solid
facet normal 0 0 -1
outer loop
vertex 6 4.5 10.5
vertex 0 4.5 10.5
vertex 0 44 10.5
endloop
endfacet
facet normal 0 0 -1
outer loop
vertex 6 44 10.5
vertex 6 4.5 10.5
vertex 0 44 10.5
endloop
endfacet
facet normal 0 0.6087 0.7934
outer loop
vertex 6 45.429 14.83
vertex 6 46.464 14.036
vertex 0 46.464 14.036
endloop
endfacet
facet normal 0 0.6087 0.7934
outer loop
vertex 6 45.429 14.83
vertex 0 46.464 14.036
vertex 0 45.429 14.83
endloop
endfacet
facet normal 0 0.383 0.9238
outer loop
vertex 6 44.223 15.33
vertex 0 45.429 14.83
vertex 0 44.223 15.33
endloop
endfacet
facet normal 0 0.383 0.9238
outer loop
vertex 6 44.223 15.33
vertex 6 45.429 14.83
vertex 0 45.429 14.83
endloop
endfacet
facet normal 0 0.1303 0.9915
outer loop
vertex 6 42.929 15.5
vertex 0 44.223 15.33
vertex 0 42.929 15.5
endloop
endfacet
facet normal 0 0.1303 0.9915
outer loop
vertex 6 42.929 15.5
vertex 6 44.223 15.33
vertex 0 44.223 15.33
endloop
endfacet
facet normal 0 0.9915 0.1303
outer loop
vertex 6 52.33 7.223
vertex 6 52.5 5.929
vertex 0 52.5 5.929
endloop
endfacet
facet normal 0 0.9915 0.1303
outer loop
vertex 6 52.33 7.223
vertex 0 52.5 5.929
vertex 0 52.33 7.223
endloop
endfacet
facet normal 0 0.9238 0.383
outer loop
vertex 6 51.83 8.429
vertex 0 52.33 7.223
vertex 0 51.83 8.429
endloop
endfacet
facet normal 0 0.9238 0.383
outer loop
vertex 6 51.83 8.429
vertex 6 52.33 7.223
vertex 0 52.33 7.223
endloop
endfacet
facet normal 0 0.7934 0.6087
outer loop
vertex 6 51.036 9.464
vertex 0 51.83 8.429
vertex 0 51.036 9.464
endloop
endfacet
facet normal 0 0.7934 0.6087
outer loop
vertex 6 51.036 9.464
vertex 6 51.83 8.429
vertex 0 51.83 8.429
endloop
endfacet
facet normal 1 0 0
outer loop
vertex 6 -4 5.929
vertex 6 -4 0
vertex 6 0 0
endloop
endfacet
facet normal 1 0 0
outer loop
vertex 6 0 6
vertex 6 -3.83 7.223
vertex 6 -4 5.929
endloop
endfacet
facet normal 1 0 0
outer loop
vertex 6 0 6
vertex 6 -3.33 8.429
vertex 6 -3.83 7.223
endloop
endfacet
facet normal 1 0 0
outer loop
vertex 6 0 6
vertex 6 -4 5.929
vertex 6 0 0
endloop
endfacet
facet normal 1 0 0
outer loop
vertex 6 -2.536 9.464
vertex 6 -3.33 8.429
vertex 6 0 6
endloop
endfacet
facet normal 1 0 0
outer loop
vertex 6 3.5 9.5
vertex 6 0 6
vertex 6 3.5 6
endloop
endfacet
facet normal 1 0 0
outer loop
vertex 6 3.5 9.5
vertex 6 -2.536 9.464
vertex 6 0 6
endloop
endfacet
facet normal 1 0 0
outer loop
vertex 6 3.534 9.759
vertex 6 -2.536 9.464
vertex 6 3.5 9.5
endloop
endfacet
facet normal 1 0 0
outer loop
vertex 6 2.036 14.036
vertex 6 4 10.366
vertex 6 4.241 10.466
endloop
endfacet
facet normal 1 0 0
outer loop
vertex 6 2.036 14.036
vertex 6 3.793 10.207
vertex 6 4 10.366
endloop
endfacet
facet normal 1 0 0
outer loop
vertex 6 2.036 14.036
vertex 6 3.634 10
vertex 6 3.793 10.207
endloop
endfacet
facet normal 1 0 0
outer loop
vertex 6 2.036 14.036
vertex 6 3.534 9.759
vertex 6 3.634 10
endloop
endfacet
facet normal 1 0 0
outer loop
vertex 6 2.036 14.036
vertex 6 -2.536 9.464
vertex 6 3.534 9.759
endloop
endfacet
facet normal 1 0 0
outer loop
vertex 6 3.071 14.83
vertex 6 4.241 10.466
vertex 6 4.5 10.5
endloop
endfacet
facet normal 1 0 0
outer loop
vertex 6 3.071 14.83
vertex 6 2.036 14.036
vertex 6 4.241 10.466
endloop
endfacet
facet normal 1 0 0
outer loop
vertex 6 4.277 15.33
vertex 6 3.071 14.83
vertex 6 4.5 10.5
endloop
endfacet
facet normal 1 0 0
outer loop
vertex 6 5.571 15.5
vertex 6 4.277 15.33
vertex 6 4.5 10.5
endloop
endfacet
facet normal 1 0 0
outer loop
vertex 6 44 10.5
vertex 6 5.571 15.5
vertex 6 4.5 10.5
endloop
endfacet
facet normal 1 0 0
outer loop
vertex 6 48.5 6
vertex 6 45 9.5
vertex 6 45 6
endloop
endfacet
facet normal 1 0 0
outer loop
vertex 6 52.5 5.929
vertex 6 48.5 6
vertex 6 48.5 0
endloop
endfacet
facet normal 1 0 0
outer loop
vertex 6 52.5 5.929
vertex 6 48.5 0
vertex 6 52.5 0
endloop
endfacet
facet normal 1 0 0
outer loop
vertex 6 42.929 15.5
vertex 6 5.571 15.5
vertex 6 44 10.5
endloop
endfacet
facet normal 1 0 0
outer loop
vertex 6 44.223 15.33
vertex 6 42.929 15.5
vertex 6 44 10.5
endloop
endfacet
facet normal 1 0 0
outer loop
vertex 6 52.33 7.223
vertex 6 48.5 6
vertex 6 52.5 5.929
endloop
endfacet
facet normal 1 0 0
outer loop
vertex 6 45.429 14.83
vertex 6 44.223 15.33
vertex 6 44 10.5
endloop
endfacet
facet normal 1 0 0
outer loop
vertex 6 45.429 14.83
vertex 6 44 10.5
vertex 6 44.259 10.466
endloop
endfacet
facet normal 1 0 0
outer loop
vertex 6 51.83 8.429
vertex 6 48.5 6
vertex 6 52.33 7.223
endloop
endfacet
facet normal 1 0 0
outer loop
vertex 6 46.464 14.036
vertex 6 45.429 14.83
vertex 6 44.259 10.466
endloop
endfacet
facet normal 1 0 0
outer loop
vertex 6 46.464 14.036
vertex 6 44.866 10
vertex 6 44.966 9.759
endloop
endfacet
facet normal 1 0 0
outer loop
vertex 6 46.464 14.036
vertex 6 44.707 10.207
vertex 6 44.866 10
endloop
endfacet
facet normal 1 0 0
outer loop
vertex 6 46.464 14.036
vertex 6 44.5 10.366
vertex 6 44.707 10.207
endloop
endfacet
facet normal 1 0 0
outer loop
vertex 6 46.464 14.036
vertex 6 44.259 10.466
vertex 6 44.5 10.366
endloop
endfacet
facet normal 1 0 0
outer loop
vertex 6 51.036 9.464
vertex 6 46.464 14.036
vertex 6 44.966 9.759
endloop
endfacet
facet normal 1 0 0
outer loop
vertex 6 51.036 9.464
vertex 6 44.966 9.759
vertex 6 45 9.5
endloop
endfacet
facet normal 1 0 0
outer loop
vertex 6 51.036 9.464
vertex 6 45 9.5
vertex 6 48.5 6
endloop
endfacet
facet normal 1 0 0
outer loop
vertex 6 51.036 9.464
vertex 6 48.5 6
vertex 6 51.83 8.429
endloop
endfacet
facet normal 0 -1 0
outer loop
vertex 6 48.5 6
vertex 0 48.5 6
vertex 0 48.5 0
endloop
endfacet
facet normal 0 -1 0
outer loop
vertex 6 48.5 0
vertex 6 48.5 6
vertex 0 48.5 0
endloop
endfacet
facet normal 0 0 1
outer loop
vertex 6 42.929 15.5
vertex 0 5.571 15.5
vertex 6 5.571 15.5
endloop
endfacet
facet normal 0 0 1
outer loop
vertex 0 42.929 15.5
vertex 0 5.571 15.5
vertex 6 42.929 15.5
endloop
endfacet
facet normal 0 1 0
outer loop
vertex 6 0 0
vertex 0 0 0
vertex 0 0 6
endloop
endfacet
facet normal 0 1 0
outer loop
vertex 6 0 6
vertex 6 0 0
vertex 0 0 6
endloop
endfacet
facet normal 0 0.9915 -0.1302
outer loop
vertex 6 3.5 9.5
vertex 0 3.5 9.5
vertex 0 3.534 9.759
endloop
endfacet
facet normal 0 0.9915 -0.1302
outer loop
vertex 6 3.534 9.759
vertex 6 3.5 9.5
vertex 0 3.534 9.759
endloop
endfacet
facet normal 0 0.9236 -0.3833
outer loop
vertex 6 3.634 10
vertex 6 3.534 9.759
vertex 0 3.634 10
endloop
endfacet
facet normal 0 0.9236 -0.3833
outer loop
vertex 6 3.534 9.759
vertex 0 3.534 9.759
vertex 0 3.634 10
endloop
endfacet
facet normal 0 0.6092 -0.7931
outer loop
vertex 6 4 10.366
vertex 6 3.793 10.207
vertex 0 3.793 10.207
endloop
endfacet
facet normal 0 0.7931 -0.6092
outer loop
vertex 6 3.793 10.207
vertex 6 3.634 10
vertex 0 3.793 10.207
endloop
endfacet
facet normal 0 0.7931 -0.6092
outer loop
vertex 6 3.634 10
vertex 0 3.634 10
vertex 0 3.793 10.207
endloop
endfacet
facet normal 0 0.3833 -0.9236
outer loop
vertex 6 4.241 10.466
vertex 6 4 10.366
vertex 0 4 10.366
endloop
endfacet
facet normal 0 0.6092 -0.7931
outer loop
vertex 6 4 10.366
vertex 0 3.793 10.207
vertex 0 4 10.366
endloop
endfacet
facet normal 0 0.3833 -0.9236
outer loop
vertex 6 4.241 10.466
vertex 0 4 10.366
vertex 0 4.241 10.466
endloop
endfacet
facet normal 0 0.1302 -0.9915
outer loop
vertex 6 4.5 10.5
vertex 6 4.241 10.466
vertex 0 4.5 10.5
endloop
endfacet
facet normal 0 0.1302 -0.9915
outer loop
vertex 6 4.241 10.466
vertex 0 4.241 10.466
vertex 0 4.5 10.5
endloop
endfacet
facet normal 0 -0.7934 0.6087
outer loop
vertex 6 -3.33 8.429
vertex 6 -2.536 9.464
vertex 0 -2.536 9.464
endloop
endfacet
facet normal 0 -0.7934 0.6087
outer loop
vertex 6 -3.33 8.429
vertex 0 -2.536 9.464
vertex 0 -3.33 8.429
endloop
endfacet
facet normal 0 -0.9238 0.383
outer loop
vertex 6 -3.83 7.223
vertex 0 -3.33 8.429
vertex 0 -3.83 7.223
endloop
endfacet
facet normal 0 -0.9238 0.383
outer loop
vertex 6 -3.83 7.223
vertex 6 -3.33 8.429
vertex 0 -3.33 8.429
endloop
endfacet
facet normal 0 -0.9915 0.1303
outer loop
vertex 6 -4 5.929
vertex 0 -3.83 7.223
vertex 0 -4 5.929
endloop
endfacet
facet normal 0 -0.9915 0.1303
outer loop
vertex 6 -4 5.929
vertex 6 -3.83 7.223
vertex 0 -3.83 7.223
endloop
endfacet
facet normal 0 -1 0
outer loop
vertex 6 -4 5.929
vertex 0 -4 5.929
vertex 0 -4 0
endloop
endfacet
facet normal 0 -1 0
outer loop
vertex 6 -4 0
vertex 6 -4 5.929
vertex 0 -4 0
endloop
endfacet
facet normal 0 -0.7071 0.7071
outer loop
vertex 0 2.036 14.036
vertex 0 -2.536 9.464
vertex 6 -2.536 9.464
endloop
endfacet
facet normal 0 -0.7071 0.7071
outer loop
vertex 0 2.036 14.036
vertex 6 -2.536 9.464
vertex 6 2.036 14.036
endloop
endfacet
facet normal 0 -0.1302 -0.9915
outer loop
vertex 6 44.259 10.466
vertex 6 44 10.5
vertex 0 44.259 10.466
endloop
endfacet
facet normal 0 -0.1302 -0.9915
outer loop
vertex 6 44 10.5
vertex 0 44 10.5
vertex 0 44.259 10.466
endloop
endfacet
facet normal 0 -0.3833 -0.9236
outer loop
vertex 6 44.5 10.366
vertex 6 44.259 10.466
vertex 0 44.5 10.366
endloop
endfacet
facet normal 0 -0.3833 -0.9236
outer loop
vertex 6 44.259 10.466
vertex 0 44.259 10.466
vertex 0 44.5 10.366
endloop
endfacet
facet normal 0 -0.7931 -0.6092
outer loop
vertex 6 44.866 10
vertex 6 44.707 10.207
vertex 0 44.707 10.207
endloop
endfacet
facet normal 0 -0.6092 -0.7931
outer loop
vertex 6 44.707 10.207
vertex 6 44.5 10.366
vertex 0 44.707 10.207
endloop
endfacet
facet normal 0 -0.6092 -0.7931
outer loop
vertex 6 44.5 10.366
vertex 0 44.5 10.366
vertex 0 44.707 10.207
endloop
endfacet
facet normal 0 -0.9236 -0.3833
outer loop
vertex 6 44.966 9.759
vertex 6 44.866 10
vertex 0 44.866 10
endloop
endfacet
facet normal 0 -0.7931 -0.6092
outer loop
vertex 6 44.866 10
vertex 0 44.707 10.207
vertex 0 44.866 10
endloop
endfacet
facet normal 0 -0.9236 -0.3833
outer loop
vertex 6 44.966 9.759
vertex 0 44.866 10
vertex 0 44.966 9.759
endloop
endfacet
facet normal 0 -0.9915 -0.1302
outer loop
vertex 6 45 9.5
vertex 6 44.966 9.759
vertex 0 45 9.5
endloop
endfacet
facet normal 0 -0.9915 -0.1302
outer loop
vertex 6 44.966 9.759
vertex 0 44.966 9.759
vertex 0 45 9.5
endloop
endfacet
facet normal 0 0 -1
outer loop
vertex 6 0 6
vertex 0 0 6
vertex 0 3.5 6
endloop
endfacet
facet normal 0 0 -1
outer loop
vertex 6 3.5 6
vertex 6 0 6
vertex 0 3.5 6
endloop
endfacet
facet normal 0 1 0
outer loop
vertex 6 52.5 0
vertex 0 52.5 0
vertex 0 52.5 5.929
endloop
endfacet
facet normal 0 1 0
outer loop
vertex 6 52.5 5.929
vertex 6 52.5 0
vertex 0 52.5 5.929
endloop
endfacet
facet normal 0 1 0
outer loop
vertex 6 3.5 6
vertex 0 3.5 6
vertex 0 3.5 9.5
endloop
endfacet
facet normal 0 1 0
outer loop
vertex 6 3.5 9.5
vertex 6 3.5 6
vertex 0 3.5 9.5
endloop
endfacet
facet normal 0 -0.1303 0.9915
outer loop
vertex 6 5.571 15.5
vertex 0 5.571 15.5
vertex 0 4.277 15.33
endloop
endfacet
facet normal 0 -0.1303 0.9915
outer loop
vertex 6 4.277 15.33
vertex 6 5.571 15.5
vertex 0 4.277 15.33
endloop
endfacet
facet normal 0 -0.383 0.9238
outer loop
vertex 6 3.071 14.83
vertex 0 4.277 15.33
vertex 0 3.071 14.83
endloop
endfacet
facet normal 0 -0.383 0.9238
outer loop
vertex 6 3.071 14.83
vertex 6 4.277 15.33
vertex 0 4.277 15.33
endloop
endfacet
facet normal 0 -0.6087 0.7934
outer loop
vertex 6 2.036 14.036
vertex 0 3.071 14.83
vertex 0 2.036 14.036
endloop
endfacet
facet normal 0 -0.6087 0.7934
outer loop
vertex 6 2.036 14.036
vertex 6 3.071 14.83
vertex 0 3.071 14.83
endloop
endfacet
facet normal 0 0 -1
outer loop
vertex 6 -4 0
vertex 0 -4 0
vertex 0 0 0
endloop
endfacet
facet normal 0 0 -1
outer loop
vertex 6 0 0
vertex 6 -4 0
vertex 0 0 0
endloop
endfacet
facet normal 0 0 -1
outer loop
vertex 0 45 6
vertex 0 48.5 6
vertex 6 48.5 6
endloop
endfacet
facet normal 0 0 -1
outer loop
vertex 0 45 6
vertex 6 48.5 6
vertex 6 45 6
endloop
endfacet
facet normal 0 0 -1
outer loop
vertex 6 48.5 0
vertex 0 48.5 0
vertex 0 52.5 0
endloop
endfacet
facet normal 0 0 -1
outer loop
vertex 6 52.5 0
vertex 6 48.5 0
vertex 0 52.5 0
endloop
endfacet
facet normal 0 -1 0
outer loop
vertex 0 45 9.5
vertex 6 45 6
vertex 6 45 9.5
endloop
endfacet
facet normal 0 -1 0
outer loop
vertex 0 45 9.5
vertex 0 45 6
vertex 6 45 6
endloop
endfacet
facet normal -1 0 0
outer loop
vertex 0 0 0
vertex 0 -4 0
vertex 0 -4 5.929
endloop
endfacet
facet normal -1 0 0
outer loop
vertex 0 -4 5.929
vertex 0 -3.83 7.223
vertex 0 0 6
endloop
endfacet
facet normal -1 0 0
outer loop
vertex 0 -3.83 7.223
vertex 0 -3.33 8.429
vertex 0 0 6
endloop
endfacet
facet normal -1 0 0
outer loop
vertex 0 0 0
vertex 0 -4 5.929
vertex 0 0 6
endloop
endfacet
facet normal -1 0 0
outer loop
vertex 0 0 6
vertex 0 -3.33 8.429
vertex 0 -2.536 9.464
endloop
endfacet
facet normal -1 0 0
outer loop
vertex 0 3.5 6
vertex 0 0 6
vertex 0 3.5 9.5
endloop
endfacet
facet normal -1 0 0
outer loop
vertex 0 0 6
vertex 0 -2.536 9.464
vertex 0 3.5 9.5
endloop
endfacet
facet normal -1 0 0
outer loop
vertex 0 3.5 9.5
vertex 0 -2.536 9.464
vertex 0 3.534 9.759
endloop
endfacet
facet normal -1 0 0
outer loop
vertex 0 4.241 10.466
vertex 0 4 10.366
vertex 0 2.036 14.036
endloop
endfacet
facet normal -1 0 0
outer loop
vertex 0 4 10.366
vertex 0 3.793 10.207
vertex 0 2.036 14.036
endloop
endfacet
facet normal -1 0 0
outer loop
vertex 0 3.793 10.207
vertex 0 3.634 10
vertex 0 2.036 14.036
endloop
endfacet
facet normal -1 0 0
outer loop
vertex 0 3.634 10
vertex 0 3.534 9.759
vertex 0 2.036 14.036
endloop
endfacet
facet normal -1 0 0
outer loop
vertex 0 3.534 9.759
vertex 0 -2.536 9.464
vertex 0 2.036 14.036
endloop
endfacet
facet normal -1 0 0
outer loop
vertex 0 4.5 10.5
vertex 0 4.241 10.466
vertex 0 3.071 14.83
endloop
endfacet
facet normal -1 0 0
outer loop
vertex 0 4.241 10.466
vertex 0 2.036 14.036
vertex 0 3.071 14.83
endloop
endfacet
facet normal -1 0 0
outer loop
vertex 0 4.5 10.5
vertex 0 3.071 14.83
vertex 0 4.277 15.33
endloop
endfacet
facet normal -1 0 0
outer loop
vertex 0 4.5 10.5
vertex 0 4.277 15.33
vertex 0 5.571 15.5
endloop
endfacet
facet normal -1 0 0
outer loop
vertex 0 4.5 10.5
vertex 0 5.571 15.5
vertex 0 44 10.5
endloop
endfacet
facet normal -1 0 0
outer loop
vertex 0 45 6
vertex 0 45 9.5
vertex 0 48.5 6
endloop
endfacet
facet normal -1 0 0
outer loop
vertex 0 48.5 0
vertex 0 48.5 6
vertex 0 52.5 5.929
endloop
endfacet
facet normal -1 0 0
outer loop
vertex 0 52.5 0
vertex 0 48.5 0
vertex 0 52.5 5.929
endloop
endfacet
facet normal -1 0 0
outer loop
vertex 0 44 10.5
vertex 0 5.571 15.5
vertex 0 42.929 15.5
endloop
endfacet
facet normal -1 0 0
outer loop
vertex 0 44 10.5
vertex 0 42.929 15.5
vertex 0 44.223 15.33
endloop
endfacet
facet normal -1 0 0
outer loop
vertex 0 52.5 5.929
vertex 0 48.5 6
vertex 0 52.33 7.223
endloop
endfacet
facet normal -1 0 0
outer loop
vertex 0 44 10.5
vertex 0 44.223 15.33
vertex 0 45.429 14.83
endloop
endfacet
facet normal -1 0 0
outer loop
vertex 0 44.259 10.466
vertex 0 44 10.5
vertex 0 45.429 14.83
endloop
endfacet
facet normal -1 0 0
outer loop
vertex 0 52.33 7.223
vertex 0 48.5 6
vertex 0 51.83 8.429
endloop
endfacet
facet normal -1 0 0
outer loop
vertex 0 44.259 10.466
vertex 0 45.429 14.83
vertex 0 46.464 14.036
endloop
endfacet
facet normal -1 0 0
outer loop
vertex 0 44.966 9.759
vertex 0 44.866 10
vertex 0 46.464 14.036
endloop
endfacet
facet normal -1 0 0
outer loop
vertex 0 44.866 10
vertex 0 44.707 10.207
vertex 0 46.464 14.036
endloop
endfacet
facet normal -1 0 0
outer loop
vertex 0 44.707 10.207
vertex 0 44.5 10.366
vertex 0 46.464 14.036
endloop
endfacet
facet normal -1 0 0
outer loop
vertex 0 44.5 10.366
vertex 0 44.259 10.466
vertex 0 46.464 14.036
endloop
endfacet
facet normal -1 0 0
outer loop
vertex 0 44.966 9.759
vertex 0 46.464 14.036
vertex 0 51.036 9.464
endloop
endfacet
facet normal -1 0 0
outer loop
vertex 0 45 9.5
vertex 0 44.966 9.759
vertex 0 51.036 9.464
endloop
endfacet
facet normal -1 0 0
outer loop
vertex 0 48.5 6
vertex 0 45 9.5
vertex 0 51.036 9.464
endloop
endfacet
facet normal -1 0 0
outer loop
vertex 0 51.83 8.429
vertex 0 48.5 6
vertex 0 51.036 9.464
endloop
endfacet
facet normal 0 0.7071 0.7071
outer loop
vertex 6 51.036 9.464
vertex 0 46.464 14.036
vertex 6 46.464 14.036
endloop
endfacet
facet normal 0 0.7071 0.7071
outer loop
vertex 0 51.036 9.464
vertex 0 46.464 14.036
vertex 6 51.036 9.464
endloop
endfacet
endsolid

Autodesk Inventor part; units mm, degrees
ref_plane "YZ Plane" through (0, 0, 0) normal (1, 0, 0) x (0, 1, 0)
ref_plane "XZ Plane" through (0, 0, 0) normal (0, 1, 0) x (-1, 0, 0)
ref_plane "XY Plane" through (0, 0, 0) normal (0, 0, 1) x (1, 0, 0)
sketch "Sketch1" plane through (0, 0, 0) normal (1, 0, 0) x (0, 1, 0)
  line L0 (48.5, 0) -> (52.5, 0)
  line L1 (52.5, 0) -> (52.5, 8)
  line L2 (-4, 8) -> (-4, 0)
  line L3 (-4, 0) -> (0, 0)
  line L4 (0, 0) -> (0, 6)
  line L5 (4.5, 10.5) -> (44, 10.5)
  line L6 (48.5, 6) -> (48.5, 0)
  line L7 (3.5, 15.5) -> (45, 15.5)
  line L8 (45, 15.5) -> (52.5, 8)
  line L9 (-4, 8) -> (3.5, 15.5)
  line L10 (48.5, 6) -> (45, 6)
  line L11 (45, 6) -> (45, 9.5)
  line L12 (0, 6) -> (3.5, 6)
  line L13 (3.5, 6) -> (3.5, 9.5)
  arc A0 (45, 9.5) -> (44, 10.5) centre (44, 9.5) ccw
  arc A1 (4.5, 10.5) -> (3.5, 9.5) centre (4.5, 9.5) ccw
  point P0 (0, 0)
  point P1 (24.25, 15.5)
  point P2 (24.25, 10.5)
  dimension "d4" = 48.5
  dimension "d31" = 5
  dimension "d37" = 4
  dimension "d46" = 3.5
  dimension "d48" = 1
  dimension "d50" = 8
  dimension "d51" = 4.5
  dimension "d52" = 6
extrude "Extrusion1" add sketch "Sketch1" along normal blind 6
fillet "Fillet1" radius 5 4 edges at (3, 3.5, 15.5) (3, 45, 15.5) (3, 52.5, 8) (3, -4, 8)
equation "\"d4\" = ServoMount"
equation "\"ServoMountLength\" = 48.5"
equation "\"ServoMount\" = 48.5"
properties part number "27080914ServoMount"
